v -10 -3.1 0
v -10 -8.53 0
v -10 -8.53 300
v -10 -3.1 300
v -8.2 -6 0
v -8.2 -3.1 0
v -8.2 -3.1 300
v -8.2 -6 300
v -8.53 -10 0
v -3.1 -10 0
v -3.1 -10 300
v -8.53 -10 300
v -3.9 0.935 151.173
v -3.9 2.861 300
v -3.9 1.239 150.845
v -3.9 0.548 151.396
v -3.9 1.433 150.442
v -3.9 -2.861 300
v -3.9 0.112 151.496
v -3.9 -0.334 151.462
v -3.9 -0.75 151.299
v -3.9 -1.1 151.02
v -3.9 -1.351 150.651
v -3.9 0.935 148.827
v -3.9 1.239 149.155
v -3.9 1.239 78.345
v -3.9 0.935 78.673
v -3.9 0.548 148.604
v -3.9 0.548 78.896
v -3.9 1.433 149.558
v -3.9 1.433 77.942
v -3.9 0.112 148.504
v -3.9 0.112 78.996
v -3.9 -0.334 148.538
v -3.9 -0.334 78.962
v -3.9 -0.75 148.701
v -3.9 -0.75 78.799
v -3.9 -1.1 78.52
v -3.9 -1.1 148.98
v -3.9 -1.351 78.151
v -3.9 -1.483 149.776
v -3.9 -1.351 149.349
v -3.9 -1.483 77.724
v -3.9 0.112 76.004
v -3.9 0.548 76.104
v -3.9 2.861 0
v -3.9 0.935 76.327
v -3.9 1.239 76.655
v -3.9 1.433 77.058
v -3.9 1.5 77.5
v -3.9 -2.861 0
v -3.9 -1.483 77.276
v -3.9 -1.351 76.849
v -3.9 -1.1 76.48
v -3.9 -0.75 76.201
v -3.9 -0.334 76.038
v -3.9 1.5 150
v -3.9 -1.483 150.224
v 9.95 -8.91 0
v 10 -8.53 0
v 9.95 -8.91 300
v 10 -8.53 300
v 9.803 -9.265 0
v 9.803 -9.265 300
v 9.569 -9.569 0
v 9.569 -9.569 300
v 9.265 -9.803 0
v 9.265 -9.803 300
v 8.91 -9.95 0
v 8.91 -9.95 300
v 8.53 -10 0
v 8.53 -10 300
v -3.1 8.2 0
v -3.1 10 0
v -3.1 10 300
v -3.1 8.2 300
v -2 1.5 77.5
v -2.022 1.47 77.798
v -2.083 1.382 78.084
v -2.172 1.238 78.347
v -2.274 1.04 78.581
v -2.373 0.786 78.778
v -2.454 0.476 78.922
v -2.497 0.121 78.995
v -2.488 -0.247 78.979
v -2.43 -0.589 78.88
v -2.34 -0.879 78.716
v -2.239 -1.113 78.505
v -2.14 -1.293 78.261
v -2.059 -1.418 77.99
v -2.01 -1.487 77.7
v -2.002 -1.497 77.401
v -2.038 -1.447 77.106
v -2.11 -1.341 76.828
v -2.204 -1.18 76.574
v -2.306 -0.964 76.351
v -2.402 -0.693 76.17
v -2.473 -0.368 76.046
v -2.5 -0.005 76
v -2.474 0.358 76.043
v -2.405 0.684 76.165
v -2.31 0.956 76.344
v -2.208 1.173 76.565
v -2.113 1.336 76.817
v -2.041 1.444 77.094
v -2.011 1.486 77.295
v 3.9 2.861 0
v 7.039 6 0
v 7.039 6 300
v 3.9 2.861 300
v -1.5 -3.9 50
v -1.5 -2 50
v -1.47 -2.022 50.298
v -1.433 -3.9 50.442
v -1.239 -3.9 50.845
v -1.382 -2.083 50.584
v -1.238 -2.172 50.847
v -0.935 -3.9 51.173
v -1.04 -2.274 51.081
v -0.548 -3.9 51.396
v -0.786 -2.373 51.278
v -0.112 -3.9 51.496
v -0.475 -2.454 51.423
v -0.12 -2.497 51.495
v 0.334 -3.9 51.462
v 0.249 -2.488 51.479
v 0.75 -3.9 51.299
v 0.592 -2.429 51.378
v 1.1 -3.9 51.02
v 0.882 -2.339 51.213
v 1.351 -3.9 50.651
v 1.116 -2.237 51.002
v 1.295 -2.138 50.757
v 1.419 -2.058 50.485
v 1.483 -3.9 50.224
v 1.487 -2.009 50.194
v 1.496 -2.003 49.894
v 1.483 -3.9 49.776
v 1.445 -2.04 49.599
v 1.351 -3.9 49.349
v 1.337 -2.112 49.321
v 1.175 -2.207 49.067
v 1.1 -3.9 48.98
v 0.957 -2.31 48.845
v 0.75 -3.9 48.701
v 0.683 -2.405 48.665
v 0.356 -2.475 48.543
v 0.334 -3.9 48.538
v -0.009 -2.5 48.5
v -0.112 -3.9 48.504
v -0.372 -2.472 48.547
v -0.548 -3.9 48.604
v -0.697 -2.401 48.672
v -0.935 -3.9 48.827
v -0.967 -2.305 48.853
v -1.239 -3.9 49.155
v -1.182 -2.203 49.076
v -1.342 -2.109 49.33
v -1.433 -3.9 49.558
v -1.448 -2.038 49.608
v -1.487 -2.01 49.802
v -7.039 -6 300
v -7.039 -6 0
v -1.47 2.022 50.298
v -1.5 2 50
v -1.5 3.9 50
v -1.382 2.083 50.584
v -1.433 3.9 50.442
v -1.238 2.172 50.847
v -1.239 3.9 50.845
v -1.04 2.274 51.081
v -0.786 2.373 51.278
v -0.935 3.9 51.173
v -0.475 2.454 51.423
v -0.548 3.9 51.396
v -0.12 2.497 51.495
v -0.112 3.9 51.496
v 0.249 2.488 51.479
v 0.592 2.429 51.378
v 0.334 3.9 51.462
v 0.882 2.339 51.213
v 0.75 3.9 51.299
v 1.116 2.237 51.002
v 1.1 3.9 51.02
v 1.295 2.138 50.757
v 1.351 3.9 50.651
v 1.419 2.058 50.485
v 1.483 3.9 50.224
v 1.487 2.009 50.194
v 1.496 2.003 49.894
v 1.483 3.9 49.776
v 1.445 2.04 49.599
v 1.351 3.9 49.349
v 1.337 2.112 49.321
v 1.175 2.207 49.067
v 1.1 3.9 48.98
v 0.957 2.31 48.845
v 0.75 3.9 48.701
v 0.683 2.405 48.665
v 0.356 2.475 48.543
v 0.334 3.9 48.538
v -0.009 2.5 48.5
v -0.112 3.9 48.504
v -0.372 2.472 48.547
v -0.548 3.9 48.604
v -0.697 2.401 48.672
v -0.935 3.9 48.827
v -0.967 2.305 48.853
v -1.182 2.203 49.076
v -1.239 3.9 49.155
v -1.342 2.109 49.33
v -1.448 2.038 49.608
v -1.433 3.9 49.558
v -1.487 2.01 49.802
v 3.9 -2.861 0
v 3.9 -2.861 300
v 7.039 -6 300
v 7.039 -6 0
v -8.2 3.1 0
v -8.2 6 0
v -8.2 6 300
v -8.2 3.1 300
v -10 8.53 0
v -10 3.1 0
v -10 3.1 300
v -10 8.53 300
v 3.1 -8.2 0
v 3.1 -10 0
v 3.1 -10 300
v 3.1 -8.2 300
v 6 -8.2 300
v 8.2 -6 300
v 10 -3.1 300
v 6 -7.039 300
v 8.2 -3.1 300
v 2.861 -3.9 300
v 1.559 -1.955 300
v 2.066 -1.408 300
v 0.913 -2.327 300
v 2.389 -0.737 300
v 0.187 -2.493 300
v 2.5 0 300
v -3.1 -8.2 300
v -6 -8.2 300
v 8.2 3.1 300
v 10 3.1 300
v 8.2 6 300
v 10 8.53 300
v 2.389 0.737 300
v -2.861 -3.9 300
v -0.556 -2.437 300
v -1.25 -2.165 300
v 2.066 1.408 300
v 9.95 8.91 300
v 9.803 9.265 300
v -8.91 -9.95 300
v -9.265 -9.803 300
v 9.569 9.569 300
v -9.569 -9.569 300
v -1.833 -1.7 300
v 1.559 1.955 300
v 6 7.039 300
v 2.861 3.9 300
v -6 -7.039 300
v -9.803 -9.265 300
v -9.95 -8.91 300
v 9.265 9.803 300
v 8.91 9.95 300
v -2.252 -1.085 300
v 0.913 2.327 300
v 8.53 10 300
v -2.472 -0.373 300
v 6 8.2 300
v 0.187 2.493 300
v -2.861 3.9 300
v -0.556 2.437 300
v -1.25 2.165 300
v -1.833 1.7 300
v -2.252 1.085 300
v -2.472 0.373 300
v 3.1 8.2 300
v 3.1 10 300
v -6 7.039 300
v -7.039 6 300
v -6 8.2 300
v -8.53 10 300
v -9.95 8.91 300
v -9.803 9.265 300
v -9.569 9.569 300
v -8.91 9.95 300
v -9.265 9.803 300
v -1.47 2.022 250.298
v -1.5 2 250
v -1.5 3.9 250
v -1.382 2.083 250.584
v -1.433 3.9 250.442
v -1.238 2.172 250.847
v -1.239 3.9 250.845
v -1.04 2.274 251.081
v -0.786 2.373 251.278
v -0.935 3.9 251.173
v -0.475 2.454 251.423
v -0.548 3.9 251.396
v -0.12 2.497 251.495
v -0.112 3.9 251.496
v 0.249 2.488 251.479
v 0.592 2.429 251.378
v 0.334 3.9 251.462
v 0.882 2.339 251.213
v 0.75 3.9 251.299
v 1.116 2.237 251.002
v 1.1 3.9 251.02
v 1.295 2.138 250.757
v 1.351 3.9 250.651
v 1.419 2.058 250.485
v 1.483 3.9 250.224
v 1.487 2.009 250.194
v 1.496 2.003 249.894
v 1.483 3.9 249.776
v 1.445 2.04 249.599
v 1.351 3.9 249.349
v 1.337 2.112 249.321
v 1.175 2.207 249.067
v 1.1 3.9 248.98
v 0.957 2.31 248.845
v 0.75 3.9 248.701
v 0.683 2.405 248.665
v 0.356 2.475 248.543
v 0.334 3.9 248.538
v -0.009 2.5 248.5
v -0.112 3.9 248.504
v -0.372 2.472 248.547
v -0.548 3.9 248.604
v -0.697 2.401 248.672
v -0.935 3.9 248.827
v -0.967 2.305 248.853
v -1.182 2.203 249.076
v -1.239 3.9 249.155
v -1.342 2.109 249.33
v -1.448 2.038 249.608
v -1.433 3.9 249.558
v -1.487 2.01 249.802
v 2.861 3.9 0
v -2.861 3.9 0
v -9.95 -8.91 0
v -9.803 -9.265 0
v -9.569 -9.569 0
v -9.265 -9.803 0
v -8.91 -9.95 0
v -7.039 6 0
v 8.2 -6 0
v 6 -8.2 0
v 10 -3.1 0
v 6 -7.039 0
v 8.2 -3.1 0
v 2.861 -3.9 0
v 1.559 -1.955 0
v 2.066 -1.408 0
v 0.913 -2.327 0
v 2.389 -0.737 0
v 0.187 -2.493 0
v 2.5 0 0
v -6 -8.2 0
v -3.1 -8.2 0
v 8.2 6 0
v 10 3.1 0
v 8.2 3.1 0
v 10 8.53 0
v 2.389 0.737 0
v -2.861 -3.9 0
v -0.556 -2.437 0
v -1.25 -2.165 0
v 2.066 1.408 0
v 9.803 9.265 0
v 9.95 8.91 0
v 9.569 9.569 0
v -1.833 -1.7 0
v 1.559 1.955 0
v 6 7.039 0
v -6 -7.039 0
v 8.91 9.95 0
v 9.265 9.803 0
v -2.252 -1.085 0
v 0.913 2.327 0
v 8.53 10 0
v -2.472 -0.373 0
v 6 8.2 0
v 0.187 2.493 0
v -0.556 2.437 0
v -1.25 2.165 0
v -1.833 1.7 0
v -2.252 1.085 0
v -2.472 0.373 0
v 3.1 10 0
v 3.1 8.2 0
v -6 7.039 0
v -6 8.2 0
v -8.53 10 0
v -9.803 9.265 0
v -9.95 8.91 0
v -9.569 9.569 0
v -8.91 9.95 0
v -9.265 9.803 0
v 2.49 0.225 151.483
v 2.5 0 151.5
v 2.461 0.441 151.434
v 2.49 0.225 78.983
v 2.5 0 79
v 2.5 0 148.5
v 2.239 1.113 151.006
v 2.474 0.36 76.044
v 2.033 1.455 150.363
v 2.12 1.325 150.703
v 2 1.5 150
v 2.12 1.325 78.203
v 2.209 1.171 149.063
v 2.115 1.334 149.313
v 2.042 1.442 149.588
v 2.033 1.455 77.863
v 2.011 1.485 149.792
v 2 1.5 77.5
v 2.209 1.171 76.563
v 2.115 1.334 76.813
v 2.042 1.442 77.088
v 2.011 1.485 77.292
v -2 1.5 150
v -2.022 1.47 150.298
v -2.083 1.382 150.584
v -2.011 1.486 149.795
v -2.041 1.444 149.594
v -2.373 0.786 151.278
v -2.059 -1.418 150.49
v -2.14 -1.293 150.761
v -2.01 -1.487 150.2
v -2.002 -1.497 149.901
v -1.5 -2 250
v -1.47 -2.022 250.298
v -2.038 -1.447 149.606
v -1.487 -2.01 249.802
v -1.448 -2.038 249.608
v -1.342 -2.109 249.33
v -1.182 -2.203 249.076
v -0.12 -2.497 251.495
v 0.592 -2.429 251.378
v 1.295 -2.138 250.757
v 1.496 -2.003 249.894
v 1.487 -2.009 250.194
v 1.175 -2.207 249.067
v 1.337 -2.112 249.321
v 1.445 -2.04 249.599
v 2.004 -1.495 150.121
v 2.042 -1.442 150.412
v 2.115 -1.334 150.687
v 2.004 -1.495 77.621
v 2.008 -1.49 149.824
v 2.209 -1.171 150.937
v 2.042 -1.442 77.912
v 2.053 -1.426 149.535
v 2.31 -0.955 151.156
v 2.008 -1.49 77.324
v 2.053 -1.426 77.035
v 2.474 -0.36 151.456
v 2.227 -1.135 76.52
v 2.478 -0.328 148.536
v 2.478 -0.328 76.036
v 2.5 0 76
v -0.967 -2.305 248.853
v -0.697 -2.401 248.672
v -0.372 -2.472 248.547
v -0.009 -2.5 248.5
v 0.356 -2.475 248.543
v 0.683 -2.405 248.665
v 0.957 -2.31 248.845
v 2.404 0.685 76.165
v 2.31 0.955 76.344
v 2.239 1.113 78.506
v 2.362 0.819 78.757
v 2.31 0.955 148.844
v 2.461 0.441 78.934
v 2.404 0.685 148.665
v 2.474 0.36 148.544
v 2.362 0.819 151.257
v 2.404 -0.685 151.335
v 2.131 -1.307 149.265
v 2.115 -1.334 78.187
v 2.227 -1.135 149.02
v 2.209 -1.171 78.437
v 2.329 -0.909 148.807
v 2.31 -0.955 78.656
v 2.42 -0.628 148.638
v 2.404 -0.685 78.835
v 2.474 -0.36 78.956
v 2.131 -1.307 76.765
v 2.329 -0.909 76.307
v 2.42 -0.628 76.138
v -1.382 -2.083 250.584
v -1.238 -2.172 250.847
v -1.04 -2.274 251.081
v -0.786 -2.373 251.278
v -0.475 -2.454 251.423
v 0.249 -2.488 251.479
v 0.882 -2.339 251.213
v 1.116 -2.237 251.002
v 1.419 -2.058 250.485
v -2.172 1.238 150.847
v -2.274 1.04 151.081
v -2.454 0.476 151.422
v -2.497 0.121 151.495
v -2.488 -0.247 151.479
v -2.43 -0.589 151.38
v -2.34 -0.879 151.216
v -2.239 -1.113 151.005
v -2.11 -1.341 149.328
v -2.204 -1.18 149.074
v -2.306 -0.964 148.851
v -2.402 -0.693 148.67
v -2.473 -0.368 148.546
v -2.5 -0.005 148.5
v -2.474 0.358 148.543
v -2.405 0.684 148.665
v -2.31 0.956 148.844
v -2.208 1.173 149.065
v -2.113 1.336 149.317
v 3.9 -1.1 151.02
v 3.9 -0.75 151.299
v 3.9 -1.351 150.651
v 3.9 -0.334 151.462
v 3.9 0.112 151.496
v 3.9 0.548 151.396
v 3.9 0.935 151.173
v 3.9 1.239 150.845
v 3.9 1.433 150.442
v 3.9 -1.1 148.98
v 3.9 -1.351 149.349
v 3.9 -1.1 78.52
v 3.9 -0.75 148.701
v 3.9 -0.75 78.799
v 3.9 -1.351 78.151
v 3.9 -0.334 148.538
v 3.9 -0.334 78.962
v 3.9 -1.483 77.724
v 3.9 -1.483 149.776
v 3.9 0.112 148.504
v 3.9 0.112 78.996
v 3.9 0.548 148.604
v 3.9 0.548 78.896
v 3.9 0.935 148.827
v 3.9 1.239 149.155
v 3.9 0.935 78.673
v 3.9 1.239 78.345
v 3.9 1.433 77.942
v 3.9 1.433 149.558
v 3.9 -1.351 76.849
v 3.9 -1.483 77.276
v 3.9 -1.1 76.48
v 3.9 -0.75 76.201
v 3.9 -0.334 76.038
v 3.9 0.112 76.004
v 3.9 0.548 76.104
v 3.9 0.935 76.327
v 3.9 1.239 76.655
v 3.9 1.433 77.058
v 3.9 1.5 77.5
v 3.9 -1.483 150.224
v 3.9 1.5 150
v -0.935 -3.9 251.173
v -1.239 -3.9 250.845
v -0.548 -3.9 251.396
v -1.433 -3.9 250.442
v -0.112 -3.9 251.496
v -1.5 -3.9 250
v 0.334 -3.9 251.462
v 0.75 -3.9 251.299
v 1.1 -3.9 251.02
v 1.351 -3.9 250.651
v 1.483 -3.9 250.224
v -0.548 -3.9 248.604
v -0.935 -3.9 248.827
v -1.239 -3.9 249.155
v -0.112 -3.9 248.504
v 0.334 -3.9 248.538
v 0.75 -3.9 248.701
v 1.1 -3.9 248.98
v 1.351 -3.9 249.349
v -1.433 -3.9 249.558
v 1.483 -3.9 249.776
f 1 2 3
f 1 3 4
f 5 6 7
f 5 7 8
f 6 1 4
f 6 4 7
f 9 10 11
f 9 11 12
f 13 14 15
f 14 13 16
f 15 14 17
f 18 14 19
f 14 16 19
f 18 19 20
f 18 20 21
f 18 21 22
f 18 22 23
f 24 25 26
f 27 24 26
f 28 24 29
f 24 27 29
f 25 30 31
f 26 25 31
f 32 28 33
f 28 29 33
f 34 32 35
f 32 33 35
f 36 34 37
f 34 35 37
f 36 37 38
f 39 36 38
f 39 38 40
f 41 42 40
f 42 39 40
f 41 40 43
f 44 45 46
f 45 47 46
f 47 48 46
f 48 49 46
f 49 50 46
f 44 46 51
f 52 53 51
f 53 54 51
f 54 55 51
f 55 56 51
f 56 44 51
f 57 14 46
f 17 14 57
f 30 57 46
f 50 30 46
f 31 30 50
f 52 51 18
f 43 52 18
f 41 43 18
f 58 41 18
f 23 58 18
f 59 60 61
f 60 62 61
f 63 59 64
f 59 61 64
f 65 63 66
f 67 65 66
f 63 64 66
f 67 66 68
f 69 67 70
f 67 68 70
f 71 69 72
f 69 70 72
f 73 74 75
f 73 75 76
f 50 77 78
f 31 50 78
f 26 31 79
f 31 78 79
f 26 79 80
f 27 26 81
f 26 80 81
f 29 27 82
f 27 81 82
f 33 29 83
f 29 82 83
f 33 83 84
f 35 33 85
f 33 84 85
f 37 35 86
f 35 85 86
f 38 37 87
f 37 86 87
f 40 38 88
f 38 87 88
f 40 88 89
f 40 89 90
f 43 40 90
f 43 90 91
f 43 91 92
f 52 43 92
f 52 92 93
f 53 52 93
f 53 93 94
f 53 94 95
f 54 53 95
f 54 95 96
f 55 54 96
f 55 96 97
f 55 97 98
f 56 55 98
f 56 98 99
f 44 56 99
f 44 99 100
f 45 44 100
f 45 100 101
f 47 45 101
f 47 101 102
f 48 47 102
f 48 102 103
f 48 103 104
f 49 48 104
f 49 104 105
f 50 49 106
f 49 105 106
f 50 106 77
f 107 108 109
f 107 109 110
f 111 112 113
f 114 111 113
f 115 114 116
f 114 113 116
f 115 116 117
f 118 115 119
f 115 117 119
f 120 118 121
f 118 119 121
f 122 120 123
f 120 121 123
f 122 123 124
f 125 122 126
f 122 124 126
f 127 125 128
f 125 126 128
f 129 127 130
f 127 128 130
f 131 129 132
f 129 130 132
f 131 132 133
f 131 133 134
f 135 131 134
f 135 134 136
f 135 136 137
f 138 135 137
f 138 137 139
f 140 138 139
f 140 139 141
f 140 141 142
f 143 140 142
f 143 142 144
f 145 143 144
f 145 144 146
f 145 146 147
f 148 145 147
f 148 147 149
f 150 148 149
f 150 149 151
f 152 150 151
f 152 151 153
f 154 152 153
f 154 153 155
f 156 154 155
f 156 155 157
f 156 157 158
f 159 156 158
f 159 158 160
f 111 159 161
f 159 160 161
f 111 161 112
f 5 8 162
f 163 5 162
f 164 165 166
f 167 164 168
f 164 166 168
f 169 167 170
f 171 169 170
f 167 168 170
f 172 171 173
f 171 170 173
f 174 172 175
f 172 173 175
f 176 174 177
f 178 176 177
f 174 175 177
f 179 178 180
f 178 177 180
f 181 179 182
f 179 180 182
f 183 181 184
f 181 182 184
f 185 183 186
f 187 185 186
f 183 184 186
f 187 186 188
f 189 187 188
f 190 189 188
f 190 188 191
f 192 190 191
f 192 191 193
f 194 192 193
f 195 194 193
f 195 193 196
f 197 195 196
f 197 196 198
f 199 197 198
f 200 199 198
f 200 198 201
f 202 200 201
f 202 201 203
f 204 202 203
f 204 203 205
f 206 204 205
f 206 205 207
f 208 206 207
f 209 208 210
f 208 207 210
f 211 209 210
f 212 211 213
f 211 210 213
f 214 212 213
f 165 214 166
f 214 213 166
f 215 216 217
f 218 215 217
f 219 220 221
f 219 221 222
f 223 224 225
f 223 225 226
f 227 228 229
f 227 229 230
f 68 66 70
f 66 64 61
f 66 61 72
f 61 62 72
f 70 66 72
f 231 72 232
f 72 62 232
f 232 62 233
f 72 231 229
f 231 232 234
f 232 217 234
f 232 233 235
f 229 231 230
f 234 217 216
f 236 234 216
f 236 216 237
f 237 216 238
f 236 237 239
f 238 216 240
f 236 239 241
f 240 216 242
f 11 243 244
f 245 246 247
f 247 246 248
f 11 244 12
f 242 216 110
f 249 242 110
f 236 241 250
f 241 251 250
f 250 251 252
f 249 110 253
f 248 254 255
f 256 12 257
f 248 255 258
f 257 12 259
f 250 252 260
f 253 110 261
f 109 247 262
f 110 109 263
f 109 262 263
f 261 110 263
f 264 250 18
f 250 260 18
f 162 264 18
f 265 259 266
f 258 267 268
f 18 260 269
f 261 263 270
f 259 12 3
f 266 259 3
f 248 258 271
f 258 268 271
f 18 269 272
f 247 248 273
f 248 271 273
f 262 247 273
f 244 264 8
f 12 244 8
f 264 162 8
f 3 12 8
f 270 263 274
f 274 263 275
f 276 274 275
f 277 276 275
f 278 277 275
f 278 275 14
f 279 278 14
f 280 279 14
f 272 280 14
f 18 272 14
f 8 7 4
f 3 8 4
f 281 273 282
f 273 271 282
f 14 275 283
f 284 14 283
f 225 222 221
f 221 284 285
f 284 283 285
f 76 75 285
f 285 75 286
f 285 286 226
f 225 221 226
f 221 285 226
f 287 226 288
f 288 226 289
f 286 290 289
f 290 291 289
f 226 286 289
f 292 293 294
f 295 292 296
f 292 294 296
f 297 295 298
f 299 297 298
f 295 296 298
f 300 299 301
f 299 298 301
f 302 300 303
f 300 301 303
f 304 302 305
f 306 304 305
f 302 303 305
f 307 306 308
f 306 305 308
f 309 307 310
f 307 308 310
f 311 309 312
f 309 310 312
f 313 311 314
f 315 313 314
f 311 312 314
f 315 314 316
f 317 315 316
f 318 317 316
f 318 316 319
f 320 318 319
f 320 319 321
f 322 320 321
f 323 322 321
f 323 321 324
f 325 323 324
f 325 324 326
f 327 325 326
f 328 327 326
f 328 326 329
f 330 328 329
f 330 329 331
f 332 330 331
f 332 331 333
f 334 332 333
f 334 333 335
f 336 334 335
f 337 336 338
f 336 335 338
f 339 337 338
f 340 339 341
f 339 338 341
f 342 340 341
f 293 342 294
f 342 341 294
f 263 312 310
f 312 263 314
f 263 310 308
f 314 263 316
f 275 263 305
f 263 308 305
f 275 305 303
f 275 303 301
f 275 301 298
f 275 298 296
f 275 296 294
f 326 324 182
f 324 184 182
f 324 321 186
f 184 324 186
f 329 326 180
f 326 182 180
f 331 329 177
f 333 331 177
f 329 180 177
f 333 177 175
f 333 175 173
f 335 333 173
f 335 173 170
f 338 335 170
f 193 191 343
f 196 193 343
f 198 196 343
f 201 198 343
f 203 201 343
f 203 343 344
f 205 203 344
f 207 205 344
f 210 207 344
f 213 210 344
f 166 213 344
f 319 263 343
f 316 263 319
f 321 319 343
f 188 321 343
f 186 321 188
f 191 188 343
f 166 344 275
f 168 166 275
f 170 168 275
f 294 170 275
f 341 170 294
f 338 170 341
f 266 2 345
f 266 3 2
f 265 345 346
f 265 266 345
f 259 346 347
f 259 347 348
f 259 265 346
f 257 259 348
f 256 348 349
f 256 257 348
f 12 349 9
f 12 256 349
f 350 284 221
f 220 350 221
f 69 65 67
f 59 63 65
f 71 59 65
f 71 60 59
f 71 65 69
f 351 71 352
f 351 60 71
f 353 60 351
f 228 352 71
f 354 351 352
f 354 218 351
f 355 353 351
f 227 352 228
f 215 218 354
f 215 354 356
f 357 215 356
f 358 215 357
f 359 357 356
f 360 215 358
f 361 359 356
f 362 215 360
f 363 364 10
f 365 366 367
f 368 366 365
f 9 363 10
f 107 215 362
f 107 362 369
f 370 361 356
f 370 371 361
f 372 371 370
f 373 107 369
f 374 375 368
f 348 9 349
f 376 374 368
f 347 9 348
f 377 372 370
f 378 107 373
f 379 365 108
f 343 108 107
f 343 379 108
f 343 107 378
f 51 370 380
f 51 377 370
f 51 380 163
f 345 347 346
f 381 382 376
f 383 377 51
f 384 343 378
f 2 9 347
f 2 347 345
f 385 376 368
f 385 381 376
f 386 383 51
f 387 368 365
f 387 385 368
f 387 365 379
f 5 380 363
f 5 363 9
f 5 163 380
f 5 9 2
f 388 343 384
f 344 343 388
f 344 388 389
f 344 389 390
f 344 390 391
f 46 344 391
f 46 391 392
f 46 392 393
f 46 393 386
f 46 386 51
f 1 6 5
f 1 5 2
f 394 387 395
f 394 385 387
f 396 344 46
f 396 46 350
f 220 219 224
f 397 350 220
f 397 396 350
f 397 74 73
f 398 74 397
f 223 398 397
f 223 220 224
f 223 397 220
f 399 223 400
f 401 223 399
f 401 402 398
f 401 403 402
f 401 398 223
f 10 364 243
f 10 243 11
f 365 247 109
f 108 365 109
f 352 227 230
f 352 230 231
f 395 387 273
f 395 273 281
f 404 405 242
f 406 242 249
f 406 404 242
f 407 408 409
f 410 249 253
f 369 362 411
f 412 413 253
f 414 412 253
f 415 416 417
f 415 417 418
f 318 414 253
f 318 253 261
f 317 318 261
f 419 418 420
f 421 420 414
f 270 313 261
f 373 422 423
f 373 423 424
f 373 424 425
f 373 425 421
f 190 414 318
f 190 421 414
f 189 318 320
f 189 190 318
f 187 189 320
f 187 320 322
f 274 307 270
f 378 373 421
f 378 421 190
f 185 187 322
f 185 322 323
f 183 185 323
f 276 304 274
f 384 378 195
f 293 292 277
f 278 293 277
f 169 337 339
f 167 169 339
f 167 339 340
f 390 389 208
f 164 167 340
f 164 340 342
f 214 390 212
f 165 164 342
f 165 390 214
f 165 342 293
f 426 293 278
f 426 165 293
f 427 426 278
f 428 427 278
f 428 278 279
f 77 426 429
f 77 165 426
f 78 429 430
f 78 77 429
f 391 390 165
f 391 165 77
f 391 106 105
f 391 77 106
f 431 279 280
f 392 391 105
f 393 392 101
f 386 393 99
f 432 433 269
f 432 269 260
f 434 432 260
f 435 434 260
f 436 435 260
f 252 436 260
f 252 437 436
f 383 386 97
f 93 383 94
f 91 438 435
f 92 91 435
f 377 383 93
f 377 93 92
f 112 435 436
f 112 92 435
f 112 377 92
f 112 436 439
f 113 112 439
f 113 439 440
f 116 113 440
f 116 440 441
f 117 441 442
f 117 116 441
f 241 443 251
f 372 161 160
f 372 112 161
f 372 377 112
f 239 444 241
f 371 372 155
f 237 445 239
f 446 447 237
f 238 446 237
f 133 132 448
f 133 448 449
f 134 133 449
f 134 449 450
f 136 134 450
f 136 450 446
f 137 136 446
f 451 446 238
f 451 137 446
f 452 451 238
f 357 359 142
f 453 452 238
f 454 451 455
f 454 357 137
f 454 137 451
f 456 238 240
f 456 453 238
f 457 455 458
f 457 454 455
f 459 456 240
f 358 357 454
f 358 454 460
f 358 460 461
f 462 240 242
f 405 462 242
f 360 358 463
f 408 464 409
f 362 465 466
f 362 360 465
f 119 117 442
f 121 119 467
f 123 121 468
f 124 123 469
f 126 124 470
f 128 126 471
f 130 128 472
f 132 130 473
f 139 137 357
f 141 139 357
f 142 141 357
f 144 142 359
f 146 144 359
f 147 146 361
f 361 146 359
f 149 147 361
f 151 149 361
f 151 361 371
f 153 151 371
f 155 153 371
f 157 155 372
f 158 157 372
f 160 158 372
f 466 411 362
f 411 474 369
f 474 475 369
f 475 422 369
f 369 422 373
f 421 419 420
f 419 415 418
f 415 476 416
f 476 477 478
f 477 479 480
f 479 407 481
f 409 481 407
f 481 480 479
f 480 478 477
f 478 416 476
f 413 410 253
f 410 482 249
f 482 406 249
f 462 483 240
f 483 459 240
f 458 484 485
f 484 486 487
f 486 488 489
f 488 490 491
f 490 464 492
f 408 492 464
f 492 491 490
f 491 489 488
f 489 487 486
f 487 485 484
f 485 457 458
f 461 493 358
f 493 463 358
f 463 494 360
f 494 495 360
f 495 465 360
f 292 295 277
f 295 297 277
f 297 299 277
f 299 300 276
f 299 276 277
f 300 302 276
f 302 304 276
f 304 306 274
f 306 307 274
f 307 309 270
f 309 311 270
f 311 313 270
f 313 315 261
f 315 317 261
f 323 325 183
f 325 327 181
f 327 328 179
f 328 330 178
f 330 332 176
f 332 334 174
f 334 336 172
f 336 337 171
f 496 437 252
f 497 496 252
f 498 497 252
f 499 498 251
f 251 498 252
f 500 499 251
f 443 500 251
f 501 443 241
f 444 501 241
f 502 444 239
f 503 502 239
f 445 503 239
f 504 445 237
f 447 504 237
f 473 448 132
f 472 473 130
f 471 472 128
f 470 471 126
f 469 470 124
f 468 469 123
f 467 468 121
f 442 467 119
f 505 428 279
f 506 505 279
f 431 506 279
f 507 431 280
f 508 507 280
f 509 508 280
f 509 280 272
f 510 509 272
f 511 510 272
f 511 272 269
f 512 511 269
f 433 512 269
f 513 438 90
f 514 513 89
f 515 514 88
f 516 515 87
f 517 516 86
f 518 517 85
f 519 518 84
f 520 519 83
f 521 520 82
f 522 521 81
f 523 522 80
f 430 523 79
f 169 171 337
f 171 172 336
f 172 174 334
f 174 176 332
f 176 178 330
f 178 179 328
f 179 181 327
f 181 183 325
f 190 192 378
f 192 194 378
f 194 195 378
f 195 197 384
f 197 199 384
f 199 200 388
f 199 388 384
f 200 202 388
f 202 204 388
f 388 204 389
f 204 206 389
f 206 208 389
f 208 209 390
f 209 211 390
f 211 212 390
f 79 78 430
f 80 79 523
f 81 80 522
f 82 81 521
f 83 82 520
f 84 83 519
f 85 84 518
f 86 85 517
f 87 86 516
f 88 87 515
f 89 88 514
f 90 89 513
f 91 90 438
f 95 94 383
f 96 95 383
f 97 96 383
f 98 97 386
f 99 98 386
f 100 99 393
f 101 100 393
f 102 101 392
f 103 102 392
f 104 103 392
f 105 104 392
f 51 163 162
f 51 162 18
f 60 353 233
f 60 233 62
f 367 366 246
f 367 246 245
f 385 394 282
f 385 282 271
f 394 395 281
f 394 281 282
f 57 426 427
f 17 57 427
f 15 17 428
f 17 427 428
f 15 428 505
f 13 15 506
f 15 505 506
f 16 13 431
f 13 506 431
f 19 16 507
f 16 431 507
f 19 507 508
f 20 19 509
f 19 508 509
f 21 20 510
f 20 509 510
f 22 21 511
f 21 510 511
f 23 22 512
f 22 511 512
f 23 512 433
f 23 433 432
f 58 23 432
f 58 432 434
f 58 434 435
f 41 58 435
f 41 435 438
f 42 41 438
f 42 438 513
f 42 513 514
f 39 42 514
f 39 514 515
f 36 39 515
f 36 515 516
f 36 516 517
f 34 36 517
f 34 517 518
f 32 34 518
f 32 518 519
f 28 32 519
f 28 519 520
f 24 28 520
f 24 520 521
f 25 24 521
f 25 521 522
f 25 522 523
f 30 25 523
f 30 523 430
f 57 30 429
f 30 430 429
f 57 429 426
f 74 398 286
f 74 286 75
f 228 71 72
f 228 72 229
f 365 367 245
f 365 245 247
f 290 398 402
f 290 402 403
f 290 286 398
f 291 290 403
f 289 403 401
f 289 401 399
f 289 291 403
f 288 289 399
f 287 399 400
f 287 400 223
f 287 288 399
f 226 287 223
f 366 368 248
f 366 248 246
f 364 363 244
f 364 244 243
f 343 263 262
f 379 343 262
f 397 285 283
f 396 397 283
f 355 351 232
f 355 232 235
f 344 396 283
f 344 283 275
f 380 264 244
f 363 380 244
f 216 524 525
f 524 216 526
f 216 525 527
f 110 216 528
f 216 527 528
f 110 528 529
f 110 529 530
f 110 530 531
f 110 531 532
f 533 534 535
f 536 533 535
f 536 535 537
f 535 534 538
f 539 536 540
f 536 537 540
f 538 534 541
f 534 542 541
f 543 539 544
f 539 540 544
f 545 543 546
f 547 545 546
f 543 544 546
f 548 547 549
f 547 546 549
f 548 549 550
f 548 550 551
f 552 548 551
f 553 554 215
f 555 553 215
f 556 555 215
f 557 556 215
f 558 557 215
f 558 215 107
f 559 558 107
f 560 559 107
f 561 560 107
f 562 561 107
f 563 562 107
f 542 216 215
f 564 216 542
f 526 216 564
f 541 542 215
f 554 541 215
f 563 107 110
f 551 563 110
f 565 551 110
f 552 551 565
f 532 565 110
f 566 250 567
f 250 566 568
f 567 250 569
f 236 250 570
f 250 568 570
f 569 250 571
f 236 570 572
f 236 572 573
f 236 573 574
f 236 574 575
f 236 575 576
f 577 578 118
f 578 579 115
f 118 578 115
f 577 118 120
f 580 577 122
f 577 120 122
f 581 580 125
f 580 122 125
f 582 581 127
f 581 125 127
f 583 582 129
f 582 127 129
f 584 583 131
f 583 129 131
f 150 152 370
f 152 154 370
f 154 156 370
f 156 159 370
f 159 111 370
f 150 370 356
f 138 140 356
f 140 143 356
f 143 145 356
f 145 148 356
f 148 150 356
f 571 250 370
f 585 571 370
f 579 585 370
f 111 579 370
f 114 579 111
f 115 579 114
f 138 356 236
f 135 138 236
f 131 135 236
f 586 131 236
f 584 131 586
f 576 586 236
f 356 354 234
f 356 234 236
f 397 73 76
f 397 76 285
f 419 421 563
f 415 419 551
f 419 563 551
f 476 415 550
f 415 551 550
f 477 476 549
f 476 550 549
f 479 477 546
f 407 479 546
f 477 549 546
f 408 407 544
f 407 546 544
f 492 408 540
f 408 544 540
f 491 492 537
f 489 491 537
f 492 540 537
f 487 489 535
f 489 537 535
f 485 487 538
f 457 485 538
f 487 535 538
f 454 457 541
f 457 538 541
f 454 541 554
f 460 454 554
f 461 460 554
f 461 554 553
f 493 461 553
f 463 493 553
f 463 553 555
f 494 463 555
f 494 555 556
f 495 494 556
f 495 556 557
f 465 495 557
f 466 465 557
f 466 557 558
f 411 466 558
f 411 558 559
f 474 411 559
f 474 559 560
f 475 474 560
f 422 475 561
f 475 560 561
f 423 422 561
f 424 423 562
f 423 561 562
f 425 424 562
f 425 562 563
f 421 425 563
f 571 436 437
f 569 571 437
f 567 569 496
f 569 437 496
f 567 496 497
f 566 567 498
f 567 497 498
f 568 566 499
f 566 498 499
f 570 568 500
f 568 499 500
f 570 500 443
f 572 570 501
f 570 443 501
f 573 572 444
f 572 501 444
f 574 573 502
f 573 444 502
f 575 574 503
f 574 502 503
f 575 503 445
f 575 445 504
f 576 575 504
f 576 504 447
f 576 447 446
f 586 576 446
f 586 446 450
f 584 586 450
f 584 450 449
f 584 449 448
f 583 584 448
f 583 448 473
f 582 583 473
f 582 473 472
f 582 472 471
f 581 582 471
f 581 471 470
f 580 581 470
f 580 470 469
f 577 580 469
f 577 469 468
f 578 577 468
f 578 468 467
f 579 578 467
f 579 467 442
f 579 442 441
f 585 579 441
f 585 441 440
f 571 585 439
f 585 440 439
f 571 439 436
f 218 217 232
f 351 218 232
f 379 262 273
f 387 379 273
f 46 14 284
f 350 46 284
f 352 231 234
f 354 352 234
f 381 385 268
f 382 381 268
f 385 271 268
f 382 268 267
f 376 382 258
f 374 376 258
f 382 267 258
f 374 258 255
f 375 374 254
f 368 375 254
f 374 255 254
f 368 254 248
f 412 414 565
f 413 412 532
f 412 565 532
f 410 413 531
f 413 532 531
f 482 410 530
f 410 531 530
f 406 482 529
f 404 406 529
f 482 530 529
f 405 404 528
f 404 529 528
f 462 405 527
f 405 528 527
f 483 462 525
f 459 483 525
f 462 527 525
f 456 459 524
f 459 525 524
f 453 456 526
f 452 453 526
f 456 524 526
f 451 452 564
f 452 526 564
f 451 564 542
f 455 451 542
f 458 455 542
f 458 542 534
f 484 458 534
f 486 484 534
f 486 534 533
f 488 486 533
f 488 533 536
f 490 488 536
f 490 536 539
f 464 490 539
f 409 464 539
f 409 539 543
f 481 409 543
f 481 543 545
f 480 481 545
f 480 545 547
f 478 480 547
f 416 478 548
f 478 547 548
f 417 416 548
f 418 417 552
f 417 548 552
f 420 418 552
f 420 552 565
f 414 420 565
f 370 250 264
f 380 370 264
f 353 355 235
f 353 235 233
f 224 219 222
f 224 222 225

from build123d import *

# Parameters (mm, degrees)
SKETCH1_R           = 2.5
BOSS_EXTRUDE1_DEPTH = 300
FILLET1_R           = 1.47
SKETCH2_R           = 1.5
CUT_EXTRUDE1_DEPTH  = 301.488285961
SKETCH3_R           = 1.5
CUT_EXTRUDE2_DEPTH  = 301.488286061
SKETCH4_R           = 1.5
CUT_EXTRUDE3_DEPTH  = 301.488286061


with BuildPart() as part:
    # Sketch1 → Boss-Extrude1 (new body)
    with BuildSketch(Plane.XY):
        Polygon((2.860553032, 3.9), (6, 7.039446968), (6, 8.2), (3.1, 8.2), (3.1, 10), (10, 10), (10, 3.1), (8.2, 3.1), (8.2, 6), (7.039446968, 6), (3.9, 2.860553032), (3.9, 0), (3.9, -2.860553032), (7.039446968, -6), (8.2, -6), (8.2, -3.1), (10, -3.1), (10, -10), (3.1, -10), (3.1, -8.2), (6, -8.2), (6, -7.039446968), (2.860553032, -3.9), (0, -3.9), (-2.860553032, -3.9), (-6, -7.039446968), (-6, -8.2), (-3.1, -8.2), (-3.1, -10), (-10, -10), (-10, -3.1), (-8.2, -3.1), (-8.2, -6), (-7.039446968, -6), (-3.9, -2.860553032), (-3.9, 0), (-3.9, 2.860553032), (-7.039446968, 6), (-8.2, 6), (-8.2, 3.1), (-10, 3.1), (-10, 10), (-3.1, 10), (-3.1, 8.2), (-6, 8.2), (-6, 7.039446968), (-2.860553032, 3.9), (0, 3.9), align=None)
        Circle(SKETCH1_R, mode=Mode.SUBTRACT)
    extrude(amount=BOSS_EXTRUDE1_DEPTH)

    # Fillet1
    fillet1_edges = [part.edges().sort_by_distance(p)[0] for p in [
        (10, -10, 150),
        (-10, -10, 150),
        (-10, 10, 150),
        (10, 10, 150),
    ]]
    fillet(fillet1_edges, radius=FILLET1_R)

    # Sketch2 → Cut-Extrude1 (cut, through all)
    with BuildSketch(Plane(origin=(3.9, 0, 0), x_dir=(0, 0, -1), z_dir=(1, 0, 0))):
        with Locations(Location((-150, 0, 0), (0, 0, 90))):
            Circle(SKETCH2_R)
    extrude(amount=-CUT_EXTRUDE1_DEPTH, mode=Mode.SUBTRACT)

    # Sketch3 → Cut-Extrude2 (cut, through all)
    with BuildSketch(Plane(origin=(3.9, 0, 0), x_dir=(0, 0, -1), z_dir=(1, 0, 0))):
        with Locations(Location((-77.5, 0, 0), (0, 0, 90))):
            Circle(SKETCH3_R)
    extrude(amount=-CUT_EXTRUDE2_DEPTH, mode=Mode.SUBTRACT)

    # Sketch4 → Cut-Extrude3 (cut, through all)
    with BuildSketch(Plane(origin=(0, 3.9, 0), x_dir=(1, 0, 0), z_dir=(0, 1, 0))):
        with Locations(Location((0, -50, 0), (0, 0, 180))):
            Circle(SKETCH4_R)
        with Locations(Location((0, -250, 0), (0, 0, 180))):
            Circle(SKETCH4_R)
    extrude(amount=-CUT_EXTRUDE3_DEPTH, mode=Mode.SUBTRACT)


solid = part.part
